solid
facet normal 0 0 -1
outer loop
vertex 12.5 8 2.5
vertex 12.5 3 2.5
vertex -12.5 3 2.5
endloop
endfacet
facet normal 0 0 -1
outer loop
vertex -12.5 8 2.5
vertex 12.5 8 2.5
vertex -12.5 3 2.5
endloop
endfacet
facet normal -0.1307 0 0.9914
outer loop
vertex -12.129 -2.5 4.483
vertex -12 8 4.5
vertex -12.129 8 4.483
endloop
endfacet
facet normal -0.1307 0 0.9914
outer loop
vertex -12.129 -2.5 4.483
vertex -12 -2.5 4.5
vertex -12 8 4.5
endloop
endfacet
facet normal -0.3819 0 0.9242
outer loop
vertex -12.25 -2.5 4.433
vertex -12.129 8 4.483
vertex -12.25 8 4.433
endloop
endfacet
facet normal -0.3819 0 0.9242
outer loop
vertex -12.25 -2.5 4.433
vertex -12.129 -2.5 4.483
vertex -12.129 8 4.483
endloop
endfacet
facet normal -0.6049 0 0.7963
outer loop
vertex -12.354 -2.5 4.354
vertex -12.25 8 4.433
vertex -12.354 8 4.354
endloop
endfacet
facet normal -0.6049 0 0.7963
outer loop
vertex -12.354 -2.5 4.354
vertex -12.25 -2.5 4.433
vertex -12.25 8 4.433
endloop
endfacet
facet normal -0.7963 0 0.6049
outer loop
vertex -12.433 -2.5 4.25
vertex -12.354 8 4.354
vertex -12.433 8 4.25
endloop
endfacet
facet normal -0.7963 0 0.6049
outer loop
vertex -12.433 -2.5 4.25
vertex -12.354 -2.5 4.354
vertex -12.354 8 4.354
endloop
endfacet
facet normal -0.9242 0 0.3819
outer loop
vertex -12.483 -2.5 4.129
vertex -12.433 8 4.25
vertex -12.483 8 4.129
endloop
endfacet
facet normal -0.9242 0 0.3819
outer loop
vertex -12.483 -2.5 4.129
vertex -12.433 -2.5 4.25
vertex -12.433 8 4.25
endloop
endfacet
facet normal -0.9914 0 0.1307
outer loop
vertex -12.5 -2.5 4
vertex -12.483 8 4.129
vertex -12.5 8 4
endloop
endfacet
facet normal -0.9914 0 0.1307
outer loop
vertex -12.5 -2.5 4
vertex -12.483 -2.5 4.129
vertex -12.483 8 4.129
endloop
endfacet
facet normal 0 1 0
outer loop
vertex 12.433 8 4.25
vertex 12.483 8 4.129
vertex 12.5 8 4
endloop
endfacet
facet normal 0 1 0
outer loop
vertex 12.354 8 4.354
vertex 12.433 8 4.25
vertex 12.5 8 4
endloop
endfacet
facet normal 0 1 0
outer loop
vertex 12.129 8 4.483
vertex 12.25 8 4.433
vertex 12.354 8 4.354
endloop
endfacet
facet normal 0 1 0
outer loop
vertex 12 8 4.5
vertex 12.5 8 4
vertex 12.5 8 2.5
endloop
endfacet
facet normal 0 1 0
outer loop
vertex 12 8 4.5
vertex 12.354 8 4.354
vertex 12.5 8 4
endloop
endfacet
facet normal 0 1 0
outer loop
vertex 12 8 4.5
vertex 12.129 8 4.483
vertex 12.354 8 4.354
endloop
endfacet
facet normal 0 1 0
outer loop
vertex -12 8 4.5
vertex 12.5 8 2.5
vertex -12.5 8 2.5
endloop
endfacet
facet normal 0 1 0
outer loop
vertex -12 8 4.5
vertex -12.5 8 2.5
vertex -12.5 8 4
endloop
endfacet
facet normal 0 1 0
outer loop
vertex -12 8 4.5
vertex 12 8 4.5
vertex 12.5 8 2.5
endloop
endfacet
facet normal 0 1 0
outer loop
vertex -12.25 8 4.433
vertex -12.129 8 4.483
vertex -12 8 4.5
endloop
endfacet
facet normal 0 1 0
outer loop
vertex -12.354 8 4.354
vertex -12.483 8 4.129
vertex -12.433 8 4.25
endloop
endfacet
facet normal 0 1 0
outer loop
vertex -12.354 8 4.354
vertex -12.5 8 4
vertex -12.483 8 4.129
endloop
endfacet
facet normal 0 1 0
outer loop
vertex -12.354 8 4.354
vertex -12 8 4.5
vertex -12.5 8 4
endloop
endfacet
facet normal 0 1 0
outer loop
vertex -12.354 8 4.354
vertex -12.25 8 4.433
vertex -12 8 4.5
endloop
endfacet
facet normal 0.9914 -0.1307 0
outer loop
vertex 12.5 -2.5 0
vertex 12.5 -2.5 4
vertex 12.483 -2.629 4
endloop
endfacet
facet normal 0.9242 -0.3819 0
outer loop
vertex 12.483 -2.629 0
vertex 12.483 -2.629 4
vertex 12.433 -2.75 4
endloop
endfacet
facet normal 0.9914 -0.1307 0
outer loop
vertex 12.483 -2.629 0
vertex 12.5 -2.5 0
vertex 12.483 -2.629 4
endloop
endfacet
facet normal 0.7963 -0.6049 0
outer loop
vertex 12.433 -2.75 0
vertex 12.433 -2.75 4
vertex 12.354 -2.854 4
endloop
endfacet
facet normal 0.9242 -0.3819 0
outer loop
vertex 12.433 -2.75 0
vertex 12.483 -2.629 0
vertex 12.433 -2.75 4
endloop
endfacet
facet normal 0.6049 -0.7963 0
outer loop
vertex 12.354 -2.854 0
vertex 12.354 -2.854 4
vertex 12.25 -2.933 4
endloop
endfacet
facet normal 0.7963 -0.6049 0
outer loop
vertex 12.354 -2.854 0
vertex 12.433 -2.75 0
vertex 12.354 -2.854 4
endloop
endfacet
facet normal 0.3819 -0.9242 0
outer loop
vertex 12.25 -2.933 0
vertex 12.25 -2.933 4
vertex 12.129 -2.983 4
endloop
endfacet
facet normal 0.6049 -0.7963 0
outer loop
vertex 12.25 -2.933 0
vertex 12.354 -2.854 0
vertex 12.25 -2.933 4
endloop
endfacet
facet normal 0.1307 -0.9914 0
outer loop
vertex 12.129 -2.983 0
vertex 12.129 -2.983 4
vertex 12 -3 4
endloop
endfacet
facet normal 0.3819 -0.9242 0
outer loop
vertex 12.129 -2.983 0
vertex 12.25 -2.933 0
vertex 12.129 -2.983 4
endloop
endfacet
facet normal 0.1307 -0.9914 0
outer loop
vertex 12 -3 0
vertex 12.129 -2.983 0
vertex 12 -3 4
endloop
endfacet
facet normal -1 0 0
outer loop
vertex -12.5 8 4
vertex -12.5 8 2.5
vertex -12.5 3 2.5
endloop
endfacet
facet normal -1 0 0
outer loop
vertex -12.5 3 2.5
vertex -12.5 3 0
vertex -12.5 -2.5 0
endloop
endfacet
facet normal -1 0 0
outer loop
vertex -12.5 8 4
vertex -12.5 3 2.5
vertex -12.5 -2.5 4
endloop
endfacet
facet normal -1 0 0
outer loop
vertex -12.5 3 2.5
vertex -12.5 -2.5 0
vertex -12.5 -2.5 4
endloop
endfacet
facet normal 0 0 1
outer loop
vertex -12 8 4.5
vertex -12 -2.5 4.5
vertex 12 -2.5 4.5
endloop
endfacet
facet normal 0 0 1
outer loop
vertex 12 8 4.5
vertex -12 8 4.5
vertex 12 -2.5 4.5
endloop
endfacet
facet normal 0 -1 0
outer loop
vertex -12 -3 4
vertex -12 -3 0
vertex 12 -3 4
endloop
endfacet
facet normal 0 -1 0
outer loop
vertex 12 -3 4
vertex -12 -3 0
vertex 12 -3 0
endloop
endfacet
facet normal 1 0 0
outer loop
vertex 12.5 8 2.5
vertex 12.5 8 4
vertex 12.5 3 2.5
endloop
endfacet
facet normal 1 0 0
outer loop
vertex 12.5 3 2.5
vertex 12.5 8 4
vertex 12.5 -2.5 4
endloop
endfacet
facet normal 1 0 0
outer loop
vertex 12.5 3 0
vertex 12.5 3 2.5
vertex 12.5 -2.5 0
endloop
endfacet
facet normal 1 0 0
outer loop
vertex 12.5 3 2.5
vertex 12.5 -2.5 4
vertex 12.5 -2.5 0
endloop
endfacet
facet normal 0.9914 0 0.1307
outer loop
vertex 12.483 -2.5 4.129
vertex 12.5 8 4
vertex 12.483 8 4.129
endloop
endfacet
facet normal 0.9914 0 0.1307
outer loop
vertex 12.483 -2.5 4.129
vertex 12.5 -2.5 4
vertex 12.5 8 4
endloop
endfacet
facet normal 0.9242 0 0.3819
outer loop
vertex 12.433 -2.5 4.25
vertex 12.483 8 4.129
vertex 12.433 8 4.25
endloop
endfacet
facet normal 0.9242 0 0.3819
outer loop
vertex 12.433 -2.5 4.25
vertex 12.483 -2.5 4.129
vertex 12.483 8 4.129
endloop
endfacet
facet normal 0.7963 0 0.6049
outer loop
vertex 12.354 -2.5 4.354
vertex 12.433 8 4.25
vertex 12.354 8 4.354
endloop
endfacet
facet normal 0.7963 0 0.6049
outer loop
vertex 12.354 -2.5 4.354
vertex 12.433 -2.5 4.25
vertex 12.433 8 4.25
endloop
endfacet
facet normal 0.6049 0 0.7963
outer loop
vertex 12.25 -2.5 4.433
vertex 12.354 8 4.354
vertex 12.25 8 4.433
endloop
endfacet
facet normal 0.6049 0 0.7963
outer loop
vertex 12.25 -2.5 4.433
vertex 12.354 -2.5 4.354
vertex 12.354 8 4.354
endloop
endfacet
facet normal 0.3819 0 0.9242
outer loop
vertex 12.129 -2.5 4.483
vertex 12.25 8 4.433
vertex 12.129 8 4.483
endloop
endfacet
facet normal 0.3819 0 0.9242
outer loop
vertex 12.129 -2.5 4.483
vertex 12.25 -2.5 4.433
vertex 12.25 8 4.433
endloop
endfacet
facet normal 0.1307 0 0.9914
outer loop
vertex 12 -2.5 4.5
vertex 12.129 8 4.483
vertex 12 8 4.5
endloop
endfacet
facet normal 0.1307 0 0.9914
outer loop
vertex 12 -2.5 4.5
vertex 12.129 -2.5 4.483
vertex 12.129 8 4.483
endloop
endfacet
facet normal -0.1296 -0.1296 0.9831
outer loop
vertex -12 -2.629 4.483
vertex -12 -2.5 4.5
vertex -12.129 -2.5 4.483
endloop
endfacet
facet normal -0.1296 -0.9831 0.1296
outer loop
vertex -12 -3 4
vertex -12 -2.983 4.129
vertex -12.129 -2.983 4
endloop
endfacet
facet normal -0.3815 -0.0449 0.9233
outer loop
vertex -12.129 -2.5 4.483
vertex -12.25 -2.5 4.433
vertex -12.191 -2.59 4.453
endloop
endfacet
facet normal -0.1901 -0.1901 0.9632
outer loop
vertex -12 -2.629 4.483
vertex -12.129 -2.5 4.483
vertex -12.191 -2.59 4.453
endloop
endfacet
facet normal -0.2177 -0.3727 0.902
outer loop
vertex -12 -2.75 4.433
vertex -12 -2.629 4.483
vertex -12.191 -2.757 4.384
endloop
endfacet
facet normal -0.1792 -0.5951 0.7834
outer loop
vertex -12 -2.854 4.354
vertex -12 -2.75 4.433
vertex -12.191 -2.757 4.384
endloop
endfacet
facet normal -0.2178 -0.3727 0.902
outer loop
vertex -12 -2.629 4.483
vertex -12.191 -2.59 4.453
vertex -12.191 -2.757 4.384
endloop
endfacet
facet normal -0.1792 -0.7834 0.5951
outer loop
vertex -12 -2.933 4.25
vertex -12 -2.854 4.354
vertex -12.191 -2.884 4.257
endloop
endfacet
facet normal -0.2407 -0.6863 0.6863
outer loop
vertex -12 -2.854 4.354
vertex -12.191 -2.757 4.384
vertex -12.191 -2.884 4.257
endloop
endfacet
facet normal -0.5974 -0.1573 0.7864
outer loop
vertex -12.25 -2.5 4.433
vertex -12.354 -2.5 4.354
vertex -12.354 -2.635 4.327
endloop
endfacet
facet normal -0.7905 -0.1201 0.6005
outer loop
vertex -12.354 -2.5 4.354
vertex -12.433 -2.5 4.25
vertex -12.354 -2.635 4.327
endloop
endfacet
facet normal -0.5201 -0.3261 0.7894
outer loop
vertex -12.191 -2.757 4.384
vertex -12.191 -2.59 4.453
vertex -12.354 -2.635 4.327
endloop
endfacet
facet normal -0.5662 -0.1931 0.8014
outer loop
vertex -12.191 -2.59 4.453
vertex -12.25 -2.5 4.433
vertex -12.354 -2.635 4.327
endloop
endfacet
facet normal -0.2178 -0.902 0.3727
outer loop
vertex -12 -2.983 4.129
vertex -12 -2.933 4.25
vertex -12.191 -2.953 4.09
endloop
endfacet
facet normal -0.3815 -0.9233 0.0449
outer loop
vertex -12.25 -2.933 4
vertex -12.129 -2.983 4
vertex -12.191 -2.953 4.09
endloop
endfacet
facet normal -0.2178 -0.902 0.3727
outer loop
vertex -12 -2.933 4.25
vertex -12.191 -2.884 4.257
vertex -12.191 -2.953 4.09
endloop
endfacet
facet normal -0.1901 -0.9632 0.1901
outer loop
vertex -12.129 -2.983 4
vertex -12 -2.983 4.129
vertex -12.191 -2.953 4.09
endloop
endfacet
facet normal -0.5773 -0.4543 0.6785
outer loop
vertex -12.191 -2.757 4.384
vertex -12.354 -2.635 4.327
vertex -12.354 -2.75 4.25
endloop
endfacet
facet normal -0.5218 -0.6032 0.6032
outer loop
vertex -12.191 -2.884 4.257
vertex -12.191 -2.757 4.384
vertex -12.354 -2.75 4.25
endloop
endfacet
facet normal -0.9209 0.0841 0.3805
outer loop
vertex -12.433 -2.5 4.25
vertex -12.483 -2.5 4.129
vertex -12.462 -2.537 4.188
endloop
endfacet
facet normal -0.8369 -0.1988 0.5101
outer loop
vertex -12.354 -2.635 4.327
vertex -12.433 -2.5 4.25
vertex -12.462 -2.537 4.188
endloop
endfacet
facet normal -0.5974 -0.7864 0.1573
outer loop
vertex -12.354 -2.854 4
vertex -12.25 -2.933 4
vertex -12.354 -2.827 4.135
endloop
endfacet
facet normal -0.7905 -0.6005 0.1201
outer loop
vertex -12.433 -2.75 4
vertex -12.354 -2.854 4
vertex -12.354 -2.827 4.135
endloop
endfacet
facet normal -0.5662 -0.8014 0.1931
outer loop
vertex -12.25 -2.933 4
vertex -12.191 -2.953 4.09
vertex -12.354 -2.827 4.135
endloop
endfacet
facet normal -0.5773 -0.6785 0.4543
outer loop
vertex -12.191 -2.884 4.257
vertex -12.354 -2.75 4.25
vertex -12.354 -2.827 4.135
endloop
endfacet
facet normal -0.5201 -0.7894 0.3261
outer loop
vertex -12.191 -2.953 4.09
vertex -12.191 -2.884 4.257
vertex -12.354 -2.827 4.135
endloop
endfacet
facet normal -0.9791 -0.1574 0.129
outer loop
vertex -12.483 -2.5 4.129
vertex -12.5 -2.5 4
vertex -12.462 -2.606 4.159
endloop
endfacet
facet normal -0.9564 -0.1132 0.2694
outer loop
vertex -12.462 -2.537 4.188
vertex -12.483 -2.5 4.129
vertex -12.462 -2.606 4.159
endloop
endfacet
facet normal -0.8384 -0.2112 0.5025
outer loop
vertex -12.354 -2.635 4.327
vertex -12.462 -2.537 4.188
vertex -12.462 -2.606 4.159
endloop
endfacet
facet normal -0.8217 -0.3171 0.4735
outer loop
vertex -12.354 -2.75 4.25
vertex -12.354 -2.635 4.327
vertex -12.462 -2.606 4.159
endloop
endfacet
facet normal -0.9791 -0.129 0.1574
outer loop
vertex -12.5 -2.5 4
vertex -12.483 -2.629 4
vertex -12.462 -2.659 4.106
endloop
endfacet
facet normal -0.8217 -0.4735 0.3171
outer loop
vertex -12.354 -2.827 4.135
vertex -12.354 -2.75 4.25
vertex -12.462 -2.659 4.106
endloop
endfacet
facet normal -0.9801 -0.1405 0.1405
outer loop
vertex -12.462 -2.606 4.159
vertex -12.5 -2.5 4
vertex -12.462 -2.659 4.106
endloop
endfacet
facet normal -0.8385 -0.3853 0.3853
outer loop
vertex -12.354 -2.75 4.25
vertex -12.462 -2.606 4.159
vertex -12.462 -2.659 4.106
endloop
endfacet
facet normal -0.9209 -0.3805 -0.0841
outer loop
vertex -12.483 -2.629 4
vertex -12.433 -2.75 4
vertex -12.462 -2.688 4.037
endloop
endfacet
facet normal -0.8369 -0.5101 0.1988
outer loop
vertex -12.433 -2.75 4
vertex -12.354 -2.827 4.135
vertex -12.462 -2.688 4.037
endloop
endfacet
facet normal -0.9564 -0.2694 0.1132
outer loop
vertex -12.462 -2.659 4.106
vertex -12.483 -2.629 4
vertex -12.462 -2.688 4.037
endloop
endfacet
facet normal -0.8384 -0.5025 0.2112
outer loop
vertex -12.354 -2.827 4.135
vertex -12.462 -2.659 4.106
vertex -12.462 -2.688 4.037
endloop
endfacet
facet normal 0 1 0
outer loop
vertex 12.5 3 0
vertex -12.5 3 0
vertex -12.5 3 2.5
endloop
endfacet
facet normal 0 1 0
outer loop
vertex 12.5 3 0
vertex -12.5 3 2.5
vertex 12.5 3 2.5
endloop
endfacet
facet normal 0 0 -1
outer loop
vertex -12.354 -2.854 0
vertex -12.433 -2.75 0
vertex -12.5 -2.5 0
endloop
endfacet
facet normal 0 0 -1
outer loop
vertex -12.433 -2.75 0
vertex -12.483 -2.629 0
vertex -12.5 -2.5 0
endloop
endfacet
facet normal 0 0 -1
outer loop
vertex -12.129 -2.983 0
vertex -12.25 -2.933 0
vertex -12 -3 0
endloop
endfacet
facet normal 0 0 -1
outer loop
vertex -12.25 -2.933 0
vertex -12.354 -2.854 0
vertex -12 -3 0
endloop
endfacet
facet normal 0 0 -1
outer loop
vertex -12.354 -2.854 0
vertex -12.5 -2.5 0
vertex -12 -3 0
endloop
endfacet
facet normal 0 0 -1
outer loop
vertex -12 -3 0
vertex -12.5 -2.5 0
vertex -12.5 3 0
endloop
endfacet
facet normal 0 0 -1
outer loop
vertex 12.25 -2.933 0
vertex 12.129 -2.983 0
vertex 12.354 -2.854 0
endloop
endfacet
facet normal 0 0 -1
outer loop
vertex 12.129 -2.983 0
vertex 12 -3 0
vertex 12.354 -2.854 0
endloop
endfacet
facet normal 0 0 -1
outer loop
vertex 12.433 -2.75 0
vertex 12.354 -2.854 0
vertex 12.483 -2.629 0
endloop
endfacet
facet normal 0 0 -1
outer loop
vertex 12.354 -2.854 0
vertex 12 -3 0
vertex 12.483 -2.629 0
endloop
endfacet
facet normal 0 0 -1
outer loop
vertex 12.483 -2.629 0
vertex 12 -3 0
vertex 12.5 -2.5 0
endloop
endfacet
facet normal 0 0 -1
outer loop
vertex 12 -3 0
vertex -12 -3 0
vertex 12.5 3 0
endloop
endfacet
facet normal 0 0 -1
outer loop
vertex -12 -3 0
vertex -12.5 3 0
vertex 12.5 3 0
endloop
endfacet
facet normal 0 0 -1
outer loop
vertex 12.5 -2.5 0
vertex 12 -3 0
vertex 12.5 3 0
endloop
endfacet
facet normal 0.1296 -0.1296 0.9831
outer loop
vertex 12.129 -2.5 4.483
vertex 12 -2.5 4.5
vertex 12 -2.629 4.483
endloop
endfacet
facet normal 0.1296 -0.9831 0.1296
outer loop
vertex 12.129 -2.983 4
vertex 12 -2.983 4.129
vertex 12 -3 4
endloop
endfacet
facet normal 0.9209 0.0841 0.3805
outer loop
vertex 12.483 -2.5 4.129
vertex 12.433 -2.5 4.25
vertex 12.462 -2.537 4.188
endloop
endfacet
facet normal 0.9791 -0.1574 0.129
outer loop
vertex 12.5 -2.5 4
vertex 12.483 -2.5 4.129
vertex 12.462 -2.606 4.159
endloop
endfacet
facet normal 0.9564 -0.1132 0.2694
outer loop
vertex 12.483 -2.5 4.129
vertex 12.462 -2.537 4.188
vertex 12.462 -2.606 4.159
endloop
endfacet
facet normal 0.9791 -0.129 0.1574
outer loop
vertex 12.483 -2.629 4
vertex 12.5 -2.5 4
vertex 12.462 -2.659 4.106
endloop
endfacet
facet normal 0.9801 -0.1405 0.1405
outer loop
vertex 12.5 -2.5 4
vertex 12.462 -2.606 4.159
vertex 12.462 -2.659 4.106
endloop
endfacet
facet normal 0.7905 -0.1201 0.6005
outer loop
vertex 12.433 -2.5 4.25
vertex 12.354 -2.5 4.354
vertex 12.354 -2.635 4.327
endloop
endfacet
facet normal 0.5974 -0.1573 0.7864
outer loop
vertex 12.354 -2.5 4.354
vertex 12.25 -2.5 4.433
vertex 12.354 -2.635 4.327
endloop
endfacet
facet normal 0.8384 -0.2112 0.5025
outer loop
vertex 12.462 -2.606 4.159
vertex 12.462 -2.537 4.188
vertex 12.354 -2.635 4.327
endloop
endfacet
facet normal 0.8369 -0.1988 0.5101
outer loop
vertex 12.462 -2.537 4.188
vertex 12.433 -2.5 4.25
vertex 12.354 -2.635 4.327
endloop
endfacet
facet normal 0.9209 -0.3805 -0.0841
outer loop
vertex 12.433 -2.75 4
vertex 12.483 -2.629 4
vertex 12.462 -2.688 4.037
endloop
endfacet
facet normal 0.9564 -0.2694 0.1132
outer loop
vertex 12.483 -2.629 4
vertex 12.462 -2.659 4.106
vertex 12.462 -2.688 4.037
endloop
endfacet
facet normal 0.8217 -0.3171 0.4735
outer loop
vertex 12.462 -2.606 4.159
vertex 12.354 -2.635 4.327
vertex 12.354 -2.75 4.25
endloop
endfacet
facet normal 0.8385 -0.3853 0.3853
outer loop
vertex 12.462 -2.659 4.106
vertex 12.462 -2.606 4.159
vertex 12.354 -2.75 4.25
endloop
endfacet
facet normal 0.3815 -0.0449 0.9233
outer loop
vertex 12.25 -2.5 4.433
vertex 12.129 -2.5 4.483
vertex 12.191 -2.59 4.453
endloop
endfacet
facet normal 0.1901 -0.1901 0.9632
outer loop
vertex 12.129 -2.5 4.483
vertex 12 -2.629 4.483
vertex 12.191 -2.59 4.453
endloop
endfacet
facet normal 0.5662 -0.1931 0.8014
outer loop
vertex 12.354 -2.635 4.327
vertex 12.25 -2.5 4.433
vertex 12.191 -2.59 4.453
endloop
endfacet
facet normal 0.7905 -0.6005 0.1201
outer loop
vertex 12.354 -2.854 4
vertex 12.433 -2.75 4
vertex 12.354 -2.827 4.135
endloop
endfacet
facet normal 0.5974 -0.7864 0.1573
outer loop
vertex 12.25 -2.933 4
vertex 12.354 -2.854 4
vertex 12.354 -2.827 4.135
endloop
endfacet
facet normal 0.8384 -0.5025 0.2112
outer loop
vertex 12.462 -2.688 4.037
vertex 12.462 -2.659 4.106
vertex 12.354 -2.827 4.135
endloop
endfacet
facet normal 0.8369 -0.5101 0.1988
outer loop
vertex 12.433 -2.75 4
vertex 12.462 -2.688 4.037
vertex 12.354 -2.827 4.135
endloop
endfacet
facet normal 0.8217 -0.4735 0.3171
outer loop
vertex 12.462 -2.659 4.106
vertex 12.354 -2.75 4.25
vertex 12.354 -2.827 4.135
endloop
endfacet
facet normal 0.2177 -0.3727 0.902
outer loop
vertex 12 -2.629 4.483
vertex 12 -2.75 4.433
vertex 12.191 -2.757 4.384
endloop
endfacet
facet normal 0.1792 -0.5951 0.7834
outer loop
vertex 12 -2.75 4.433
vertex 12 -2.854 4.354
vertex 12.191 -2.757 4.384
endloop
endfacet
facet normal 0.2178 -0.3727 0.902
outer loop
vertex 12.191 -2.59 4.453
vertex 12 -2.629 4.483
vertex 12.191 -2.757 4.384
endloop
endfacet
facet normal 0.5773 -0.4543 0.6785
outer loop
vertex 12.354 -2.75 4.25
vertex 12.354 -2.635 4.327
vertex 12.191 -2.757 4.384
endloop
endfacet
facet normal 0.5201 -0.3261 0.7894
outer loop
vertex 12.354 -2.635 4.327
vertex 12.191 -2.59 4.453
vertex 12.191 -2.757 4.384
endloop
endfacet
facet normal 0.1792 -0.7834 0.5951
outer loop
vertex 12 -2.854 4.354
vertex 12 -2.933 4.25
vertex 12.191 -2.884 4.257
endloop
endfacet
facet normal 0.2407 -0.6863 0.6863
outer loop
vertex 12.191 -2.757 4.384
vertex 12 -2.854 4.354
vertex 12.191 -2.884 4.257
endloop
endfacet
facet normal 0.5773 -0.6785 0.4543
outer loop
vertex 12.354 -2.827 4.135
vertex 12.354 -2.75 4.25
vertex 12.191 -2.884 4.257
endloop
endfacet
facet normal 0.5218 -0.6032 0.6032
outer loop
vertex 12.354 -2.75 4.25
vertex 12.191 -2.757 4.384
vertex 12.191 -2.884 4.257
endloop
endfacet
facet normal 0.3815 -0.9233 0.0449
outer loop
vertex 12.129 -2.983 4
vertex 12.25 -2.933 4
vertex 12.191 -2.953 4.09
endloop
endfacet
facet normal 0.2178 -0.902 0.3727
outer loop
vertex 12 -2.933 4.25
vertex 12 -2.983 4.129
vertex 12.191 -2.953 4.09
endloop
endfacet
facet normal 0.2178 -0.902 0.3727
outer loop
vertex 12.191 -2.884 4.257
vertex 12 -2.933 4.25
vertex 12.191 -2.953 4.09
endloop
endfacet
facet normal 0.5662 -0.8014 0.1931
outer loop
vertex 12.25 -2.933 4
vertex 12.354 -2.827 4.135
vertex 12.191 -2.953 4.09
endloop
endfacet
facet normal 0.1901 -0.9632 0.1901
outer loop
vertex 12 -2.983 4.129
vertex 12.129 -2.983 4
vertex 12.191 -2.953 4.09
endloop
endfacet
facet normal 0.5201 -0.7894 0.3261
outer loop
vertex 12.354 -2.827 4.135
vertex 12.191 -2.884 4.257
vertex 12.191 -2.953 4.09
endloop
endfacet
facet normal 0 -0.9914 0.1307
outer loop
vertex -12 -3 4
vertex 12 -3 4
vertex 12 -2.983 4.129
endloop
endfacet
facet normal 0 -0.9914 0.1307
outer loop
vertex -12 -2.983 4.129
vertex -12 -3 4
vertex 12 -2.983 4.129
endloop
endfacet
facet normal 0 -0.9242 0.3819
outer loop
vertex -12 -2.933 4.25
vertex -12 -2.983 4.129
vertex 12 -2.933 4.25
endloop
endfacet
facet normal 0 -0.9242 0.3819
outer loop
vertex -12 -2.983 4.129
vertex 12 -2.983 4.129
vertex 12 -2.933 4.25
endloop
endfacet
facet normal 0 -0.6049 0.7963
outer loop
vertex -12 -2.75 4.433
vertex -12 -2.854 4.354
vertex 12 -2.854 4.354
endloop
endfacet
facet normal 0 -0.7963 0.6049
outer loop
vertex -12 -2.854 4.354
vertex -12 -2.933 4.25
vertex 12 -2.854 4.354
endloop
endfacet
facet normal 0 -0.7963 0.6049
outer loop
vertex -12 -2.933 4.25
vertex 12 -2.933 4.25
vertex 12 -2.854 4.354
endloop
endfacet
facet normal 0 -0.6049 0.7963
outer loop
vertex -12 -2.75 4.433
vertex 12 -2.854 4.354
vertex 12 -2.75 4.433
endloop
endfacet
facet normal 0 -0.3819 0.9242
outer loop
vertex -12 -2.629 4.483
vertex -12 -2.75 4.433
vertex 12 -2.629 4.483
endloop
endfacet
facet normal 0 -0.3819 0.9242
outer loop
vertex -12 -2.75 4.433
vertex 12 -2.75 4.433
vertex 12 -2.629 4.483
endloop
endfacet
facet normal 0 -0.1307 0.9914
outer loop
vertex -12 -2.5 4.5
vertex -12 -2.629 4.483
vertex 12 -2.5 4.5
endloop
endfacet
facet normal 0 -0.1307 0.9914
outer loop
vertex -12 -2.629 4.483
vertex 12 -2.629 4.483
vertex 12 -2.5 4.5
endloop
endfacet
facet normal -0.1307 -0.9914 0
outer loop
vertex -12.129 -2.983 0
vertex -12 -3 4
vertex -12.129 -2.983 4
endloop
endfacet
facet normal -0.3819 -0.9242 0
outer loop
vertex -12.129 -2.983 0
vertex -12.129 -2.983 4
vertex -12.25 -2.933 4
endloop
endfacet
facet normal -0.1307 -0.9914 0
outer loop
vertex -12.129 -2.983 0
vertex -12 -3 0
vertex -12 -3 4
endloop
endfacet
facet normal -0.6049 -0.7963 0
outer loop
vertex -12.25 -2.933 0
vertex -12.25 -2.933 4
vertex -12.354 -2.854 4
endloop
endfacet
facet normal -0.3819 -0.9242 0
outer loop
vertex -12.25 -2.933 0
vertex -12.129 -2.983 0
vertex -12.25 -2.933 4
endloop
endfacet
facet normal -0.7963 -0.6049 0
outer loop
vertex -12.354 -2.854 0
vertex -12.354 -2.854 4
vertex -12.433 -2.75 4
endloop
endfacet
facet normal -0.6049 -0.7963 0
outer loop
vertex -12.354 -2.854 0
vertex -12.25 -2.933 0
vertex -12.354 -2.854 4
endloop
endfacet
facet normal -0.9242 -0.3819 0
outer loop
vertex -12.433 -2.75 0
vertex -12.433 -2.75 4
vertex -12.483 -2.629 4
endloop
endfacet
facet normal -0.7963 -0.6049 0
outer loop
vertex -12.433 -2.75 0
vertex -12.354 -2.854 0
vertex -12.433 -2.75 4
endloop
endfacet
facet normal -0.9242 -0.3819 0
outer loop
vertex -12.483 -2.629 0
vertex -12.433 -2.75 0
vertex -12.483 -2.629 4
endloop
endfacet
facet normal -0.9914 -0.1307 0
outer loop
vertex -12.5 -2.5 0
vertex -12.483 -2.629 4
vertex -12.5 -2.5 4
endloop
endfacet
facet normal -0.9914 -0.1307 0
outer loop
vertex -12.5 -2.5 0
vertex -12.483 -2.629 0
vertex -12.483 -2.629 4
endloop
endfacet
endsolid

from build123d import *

# Parameters (mm, degrees)
F0_W     = 25
F0_H     = 6
F1_DEPTH = 4.5
F3_DEPTH = 5
F4_R     = 0.5
F5_R     = 0.5


with BuildPart() as f1:
    # F0 (on Top) → F1 (new body)
    with BuildSketch(Plane.XY):
        Rectangle(F0_W, F0_H)
    extrude(amount=F1_DEPTH)

    # F2 (on face) → F3 (join)
    with BuildSketch(Plane(origin=(0, 3, 0), x_dir=(-1, 0, 0), z_dir=(0, 1, 0))):
        Polygon((-12.5, 4.5), (-12.5, 2.5), (10.169396, 2.5), (12.5, 2.5), (12.5, 4.5), align=None)
    extrude(amount=F3_DEPTH)

    # F4
    f4_edges = [f1.edges().sort_by_distance(p)[0] for p in [
        (0, -3, 4.5),
    ]]
    fillet(f4_edges, radius=F4_R)

    # F5
    f5_edges = [f1.edges().sort_by_distance(p)[0] for p in [
        (12.5, 2.75, 4.5),
        (-12.5, 2.75, 4.5),
    ]]
    fillet(f5_edges, radius=F5_R)


solid = f1.part
